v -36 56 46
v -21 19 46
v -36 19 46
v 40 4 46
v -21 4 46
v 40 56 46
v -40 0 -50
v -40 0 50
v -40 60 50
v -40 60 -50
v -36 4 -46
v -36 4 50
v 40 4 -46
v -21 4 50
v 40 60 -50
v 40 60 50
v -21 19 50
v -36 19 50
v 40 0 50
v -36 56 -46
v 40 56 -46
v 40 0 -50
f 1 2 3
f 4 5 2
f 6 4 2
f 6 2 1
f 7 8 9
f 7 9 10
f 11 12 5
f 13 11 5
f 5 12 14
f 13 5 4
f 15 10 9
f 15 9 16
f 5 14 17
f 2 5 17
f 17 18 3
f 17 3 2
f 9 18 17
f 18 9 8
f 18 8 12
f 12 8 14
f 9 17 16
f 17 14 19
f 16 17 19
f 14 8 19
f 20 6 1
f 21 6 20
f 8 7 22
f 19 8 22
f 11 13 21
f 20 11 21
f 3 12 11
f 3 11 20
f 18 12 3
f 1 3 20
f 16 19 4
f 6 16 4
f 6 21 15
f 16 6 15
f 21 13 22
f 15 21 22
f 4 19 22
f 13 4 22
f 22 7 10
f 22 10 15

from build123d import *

# Parameters (mm, degrees)
SKETCH1_W           = 80
SKETCH1_H           = 100
BOSS_EXTRUDE1_DEPTH = 60
SKETCH4_W           = 92
SKETCH4_H           = 52
CUT_EXTRUDE1_DEPTH  = 76
SKETCH5_W           = 15
SKETCH5_H           = 15
CUT_EXTRUDE2_DEPTH  = 4


with BuildPart() as part:
    # Sketch1 → Boss-Extrude1 (new body)
    with BuildSketch(Plane(origin=(0, 0, 0), x_dir=(1, 0, 0), z_dir=(0, 1, 0))):
        Rectangle(SKETCH1_W, SKETCH1_H)
    extrude(amount=BOSS_EXTRUDE1_DEPTH)

    # Sketch4 → Cut-Extrude1 (cut)
    with BuildSketch(Plane(origin=(40, 0, 0), x_dir=(0, 0, -1), z_dir=(1, 0, 0))):
        with Locations((0, 30)):
            Rectangle(SKETCH4_W, SKETCH4_H)
    extrude(amount=-CUT_EXTRUDE1_DEPTH, mode=Mode.SUBTRACT)

    # Sketch5 → Cut-Extrude2 (cut)
    with BuildSketch(Plane.XY.offset(50)):
        with Locations((-28.5, 11.5)):
            Rectangle(SKETCH5_W, SKETCH5_H)
    extrude(amount=-CUT_EXTRUDE2_DEPTH, mode=Mode.SUBTRACT)


solid = part.part
